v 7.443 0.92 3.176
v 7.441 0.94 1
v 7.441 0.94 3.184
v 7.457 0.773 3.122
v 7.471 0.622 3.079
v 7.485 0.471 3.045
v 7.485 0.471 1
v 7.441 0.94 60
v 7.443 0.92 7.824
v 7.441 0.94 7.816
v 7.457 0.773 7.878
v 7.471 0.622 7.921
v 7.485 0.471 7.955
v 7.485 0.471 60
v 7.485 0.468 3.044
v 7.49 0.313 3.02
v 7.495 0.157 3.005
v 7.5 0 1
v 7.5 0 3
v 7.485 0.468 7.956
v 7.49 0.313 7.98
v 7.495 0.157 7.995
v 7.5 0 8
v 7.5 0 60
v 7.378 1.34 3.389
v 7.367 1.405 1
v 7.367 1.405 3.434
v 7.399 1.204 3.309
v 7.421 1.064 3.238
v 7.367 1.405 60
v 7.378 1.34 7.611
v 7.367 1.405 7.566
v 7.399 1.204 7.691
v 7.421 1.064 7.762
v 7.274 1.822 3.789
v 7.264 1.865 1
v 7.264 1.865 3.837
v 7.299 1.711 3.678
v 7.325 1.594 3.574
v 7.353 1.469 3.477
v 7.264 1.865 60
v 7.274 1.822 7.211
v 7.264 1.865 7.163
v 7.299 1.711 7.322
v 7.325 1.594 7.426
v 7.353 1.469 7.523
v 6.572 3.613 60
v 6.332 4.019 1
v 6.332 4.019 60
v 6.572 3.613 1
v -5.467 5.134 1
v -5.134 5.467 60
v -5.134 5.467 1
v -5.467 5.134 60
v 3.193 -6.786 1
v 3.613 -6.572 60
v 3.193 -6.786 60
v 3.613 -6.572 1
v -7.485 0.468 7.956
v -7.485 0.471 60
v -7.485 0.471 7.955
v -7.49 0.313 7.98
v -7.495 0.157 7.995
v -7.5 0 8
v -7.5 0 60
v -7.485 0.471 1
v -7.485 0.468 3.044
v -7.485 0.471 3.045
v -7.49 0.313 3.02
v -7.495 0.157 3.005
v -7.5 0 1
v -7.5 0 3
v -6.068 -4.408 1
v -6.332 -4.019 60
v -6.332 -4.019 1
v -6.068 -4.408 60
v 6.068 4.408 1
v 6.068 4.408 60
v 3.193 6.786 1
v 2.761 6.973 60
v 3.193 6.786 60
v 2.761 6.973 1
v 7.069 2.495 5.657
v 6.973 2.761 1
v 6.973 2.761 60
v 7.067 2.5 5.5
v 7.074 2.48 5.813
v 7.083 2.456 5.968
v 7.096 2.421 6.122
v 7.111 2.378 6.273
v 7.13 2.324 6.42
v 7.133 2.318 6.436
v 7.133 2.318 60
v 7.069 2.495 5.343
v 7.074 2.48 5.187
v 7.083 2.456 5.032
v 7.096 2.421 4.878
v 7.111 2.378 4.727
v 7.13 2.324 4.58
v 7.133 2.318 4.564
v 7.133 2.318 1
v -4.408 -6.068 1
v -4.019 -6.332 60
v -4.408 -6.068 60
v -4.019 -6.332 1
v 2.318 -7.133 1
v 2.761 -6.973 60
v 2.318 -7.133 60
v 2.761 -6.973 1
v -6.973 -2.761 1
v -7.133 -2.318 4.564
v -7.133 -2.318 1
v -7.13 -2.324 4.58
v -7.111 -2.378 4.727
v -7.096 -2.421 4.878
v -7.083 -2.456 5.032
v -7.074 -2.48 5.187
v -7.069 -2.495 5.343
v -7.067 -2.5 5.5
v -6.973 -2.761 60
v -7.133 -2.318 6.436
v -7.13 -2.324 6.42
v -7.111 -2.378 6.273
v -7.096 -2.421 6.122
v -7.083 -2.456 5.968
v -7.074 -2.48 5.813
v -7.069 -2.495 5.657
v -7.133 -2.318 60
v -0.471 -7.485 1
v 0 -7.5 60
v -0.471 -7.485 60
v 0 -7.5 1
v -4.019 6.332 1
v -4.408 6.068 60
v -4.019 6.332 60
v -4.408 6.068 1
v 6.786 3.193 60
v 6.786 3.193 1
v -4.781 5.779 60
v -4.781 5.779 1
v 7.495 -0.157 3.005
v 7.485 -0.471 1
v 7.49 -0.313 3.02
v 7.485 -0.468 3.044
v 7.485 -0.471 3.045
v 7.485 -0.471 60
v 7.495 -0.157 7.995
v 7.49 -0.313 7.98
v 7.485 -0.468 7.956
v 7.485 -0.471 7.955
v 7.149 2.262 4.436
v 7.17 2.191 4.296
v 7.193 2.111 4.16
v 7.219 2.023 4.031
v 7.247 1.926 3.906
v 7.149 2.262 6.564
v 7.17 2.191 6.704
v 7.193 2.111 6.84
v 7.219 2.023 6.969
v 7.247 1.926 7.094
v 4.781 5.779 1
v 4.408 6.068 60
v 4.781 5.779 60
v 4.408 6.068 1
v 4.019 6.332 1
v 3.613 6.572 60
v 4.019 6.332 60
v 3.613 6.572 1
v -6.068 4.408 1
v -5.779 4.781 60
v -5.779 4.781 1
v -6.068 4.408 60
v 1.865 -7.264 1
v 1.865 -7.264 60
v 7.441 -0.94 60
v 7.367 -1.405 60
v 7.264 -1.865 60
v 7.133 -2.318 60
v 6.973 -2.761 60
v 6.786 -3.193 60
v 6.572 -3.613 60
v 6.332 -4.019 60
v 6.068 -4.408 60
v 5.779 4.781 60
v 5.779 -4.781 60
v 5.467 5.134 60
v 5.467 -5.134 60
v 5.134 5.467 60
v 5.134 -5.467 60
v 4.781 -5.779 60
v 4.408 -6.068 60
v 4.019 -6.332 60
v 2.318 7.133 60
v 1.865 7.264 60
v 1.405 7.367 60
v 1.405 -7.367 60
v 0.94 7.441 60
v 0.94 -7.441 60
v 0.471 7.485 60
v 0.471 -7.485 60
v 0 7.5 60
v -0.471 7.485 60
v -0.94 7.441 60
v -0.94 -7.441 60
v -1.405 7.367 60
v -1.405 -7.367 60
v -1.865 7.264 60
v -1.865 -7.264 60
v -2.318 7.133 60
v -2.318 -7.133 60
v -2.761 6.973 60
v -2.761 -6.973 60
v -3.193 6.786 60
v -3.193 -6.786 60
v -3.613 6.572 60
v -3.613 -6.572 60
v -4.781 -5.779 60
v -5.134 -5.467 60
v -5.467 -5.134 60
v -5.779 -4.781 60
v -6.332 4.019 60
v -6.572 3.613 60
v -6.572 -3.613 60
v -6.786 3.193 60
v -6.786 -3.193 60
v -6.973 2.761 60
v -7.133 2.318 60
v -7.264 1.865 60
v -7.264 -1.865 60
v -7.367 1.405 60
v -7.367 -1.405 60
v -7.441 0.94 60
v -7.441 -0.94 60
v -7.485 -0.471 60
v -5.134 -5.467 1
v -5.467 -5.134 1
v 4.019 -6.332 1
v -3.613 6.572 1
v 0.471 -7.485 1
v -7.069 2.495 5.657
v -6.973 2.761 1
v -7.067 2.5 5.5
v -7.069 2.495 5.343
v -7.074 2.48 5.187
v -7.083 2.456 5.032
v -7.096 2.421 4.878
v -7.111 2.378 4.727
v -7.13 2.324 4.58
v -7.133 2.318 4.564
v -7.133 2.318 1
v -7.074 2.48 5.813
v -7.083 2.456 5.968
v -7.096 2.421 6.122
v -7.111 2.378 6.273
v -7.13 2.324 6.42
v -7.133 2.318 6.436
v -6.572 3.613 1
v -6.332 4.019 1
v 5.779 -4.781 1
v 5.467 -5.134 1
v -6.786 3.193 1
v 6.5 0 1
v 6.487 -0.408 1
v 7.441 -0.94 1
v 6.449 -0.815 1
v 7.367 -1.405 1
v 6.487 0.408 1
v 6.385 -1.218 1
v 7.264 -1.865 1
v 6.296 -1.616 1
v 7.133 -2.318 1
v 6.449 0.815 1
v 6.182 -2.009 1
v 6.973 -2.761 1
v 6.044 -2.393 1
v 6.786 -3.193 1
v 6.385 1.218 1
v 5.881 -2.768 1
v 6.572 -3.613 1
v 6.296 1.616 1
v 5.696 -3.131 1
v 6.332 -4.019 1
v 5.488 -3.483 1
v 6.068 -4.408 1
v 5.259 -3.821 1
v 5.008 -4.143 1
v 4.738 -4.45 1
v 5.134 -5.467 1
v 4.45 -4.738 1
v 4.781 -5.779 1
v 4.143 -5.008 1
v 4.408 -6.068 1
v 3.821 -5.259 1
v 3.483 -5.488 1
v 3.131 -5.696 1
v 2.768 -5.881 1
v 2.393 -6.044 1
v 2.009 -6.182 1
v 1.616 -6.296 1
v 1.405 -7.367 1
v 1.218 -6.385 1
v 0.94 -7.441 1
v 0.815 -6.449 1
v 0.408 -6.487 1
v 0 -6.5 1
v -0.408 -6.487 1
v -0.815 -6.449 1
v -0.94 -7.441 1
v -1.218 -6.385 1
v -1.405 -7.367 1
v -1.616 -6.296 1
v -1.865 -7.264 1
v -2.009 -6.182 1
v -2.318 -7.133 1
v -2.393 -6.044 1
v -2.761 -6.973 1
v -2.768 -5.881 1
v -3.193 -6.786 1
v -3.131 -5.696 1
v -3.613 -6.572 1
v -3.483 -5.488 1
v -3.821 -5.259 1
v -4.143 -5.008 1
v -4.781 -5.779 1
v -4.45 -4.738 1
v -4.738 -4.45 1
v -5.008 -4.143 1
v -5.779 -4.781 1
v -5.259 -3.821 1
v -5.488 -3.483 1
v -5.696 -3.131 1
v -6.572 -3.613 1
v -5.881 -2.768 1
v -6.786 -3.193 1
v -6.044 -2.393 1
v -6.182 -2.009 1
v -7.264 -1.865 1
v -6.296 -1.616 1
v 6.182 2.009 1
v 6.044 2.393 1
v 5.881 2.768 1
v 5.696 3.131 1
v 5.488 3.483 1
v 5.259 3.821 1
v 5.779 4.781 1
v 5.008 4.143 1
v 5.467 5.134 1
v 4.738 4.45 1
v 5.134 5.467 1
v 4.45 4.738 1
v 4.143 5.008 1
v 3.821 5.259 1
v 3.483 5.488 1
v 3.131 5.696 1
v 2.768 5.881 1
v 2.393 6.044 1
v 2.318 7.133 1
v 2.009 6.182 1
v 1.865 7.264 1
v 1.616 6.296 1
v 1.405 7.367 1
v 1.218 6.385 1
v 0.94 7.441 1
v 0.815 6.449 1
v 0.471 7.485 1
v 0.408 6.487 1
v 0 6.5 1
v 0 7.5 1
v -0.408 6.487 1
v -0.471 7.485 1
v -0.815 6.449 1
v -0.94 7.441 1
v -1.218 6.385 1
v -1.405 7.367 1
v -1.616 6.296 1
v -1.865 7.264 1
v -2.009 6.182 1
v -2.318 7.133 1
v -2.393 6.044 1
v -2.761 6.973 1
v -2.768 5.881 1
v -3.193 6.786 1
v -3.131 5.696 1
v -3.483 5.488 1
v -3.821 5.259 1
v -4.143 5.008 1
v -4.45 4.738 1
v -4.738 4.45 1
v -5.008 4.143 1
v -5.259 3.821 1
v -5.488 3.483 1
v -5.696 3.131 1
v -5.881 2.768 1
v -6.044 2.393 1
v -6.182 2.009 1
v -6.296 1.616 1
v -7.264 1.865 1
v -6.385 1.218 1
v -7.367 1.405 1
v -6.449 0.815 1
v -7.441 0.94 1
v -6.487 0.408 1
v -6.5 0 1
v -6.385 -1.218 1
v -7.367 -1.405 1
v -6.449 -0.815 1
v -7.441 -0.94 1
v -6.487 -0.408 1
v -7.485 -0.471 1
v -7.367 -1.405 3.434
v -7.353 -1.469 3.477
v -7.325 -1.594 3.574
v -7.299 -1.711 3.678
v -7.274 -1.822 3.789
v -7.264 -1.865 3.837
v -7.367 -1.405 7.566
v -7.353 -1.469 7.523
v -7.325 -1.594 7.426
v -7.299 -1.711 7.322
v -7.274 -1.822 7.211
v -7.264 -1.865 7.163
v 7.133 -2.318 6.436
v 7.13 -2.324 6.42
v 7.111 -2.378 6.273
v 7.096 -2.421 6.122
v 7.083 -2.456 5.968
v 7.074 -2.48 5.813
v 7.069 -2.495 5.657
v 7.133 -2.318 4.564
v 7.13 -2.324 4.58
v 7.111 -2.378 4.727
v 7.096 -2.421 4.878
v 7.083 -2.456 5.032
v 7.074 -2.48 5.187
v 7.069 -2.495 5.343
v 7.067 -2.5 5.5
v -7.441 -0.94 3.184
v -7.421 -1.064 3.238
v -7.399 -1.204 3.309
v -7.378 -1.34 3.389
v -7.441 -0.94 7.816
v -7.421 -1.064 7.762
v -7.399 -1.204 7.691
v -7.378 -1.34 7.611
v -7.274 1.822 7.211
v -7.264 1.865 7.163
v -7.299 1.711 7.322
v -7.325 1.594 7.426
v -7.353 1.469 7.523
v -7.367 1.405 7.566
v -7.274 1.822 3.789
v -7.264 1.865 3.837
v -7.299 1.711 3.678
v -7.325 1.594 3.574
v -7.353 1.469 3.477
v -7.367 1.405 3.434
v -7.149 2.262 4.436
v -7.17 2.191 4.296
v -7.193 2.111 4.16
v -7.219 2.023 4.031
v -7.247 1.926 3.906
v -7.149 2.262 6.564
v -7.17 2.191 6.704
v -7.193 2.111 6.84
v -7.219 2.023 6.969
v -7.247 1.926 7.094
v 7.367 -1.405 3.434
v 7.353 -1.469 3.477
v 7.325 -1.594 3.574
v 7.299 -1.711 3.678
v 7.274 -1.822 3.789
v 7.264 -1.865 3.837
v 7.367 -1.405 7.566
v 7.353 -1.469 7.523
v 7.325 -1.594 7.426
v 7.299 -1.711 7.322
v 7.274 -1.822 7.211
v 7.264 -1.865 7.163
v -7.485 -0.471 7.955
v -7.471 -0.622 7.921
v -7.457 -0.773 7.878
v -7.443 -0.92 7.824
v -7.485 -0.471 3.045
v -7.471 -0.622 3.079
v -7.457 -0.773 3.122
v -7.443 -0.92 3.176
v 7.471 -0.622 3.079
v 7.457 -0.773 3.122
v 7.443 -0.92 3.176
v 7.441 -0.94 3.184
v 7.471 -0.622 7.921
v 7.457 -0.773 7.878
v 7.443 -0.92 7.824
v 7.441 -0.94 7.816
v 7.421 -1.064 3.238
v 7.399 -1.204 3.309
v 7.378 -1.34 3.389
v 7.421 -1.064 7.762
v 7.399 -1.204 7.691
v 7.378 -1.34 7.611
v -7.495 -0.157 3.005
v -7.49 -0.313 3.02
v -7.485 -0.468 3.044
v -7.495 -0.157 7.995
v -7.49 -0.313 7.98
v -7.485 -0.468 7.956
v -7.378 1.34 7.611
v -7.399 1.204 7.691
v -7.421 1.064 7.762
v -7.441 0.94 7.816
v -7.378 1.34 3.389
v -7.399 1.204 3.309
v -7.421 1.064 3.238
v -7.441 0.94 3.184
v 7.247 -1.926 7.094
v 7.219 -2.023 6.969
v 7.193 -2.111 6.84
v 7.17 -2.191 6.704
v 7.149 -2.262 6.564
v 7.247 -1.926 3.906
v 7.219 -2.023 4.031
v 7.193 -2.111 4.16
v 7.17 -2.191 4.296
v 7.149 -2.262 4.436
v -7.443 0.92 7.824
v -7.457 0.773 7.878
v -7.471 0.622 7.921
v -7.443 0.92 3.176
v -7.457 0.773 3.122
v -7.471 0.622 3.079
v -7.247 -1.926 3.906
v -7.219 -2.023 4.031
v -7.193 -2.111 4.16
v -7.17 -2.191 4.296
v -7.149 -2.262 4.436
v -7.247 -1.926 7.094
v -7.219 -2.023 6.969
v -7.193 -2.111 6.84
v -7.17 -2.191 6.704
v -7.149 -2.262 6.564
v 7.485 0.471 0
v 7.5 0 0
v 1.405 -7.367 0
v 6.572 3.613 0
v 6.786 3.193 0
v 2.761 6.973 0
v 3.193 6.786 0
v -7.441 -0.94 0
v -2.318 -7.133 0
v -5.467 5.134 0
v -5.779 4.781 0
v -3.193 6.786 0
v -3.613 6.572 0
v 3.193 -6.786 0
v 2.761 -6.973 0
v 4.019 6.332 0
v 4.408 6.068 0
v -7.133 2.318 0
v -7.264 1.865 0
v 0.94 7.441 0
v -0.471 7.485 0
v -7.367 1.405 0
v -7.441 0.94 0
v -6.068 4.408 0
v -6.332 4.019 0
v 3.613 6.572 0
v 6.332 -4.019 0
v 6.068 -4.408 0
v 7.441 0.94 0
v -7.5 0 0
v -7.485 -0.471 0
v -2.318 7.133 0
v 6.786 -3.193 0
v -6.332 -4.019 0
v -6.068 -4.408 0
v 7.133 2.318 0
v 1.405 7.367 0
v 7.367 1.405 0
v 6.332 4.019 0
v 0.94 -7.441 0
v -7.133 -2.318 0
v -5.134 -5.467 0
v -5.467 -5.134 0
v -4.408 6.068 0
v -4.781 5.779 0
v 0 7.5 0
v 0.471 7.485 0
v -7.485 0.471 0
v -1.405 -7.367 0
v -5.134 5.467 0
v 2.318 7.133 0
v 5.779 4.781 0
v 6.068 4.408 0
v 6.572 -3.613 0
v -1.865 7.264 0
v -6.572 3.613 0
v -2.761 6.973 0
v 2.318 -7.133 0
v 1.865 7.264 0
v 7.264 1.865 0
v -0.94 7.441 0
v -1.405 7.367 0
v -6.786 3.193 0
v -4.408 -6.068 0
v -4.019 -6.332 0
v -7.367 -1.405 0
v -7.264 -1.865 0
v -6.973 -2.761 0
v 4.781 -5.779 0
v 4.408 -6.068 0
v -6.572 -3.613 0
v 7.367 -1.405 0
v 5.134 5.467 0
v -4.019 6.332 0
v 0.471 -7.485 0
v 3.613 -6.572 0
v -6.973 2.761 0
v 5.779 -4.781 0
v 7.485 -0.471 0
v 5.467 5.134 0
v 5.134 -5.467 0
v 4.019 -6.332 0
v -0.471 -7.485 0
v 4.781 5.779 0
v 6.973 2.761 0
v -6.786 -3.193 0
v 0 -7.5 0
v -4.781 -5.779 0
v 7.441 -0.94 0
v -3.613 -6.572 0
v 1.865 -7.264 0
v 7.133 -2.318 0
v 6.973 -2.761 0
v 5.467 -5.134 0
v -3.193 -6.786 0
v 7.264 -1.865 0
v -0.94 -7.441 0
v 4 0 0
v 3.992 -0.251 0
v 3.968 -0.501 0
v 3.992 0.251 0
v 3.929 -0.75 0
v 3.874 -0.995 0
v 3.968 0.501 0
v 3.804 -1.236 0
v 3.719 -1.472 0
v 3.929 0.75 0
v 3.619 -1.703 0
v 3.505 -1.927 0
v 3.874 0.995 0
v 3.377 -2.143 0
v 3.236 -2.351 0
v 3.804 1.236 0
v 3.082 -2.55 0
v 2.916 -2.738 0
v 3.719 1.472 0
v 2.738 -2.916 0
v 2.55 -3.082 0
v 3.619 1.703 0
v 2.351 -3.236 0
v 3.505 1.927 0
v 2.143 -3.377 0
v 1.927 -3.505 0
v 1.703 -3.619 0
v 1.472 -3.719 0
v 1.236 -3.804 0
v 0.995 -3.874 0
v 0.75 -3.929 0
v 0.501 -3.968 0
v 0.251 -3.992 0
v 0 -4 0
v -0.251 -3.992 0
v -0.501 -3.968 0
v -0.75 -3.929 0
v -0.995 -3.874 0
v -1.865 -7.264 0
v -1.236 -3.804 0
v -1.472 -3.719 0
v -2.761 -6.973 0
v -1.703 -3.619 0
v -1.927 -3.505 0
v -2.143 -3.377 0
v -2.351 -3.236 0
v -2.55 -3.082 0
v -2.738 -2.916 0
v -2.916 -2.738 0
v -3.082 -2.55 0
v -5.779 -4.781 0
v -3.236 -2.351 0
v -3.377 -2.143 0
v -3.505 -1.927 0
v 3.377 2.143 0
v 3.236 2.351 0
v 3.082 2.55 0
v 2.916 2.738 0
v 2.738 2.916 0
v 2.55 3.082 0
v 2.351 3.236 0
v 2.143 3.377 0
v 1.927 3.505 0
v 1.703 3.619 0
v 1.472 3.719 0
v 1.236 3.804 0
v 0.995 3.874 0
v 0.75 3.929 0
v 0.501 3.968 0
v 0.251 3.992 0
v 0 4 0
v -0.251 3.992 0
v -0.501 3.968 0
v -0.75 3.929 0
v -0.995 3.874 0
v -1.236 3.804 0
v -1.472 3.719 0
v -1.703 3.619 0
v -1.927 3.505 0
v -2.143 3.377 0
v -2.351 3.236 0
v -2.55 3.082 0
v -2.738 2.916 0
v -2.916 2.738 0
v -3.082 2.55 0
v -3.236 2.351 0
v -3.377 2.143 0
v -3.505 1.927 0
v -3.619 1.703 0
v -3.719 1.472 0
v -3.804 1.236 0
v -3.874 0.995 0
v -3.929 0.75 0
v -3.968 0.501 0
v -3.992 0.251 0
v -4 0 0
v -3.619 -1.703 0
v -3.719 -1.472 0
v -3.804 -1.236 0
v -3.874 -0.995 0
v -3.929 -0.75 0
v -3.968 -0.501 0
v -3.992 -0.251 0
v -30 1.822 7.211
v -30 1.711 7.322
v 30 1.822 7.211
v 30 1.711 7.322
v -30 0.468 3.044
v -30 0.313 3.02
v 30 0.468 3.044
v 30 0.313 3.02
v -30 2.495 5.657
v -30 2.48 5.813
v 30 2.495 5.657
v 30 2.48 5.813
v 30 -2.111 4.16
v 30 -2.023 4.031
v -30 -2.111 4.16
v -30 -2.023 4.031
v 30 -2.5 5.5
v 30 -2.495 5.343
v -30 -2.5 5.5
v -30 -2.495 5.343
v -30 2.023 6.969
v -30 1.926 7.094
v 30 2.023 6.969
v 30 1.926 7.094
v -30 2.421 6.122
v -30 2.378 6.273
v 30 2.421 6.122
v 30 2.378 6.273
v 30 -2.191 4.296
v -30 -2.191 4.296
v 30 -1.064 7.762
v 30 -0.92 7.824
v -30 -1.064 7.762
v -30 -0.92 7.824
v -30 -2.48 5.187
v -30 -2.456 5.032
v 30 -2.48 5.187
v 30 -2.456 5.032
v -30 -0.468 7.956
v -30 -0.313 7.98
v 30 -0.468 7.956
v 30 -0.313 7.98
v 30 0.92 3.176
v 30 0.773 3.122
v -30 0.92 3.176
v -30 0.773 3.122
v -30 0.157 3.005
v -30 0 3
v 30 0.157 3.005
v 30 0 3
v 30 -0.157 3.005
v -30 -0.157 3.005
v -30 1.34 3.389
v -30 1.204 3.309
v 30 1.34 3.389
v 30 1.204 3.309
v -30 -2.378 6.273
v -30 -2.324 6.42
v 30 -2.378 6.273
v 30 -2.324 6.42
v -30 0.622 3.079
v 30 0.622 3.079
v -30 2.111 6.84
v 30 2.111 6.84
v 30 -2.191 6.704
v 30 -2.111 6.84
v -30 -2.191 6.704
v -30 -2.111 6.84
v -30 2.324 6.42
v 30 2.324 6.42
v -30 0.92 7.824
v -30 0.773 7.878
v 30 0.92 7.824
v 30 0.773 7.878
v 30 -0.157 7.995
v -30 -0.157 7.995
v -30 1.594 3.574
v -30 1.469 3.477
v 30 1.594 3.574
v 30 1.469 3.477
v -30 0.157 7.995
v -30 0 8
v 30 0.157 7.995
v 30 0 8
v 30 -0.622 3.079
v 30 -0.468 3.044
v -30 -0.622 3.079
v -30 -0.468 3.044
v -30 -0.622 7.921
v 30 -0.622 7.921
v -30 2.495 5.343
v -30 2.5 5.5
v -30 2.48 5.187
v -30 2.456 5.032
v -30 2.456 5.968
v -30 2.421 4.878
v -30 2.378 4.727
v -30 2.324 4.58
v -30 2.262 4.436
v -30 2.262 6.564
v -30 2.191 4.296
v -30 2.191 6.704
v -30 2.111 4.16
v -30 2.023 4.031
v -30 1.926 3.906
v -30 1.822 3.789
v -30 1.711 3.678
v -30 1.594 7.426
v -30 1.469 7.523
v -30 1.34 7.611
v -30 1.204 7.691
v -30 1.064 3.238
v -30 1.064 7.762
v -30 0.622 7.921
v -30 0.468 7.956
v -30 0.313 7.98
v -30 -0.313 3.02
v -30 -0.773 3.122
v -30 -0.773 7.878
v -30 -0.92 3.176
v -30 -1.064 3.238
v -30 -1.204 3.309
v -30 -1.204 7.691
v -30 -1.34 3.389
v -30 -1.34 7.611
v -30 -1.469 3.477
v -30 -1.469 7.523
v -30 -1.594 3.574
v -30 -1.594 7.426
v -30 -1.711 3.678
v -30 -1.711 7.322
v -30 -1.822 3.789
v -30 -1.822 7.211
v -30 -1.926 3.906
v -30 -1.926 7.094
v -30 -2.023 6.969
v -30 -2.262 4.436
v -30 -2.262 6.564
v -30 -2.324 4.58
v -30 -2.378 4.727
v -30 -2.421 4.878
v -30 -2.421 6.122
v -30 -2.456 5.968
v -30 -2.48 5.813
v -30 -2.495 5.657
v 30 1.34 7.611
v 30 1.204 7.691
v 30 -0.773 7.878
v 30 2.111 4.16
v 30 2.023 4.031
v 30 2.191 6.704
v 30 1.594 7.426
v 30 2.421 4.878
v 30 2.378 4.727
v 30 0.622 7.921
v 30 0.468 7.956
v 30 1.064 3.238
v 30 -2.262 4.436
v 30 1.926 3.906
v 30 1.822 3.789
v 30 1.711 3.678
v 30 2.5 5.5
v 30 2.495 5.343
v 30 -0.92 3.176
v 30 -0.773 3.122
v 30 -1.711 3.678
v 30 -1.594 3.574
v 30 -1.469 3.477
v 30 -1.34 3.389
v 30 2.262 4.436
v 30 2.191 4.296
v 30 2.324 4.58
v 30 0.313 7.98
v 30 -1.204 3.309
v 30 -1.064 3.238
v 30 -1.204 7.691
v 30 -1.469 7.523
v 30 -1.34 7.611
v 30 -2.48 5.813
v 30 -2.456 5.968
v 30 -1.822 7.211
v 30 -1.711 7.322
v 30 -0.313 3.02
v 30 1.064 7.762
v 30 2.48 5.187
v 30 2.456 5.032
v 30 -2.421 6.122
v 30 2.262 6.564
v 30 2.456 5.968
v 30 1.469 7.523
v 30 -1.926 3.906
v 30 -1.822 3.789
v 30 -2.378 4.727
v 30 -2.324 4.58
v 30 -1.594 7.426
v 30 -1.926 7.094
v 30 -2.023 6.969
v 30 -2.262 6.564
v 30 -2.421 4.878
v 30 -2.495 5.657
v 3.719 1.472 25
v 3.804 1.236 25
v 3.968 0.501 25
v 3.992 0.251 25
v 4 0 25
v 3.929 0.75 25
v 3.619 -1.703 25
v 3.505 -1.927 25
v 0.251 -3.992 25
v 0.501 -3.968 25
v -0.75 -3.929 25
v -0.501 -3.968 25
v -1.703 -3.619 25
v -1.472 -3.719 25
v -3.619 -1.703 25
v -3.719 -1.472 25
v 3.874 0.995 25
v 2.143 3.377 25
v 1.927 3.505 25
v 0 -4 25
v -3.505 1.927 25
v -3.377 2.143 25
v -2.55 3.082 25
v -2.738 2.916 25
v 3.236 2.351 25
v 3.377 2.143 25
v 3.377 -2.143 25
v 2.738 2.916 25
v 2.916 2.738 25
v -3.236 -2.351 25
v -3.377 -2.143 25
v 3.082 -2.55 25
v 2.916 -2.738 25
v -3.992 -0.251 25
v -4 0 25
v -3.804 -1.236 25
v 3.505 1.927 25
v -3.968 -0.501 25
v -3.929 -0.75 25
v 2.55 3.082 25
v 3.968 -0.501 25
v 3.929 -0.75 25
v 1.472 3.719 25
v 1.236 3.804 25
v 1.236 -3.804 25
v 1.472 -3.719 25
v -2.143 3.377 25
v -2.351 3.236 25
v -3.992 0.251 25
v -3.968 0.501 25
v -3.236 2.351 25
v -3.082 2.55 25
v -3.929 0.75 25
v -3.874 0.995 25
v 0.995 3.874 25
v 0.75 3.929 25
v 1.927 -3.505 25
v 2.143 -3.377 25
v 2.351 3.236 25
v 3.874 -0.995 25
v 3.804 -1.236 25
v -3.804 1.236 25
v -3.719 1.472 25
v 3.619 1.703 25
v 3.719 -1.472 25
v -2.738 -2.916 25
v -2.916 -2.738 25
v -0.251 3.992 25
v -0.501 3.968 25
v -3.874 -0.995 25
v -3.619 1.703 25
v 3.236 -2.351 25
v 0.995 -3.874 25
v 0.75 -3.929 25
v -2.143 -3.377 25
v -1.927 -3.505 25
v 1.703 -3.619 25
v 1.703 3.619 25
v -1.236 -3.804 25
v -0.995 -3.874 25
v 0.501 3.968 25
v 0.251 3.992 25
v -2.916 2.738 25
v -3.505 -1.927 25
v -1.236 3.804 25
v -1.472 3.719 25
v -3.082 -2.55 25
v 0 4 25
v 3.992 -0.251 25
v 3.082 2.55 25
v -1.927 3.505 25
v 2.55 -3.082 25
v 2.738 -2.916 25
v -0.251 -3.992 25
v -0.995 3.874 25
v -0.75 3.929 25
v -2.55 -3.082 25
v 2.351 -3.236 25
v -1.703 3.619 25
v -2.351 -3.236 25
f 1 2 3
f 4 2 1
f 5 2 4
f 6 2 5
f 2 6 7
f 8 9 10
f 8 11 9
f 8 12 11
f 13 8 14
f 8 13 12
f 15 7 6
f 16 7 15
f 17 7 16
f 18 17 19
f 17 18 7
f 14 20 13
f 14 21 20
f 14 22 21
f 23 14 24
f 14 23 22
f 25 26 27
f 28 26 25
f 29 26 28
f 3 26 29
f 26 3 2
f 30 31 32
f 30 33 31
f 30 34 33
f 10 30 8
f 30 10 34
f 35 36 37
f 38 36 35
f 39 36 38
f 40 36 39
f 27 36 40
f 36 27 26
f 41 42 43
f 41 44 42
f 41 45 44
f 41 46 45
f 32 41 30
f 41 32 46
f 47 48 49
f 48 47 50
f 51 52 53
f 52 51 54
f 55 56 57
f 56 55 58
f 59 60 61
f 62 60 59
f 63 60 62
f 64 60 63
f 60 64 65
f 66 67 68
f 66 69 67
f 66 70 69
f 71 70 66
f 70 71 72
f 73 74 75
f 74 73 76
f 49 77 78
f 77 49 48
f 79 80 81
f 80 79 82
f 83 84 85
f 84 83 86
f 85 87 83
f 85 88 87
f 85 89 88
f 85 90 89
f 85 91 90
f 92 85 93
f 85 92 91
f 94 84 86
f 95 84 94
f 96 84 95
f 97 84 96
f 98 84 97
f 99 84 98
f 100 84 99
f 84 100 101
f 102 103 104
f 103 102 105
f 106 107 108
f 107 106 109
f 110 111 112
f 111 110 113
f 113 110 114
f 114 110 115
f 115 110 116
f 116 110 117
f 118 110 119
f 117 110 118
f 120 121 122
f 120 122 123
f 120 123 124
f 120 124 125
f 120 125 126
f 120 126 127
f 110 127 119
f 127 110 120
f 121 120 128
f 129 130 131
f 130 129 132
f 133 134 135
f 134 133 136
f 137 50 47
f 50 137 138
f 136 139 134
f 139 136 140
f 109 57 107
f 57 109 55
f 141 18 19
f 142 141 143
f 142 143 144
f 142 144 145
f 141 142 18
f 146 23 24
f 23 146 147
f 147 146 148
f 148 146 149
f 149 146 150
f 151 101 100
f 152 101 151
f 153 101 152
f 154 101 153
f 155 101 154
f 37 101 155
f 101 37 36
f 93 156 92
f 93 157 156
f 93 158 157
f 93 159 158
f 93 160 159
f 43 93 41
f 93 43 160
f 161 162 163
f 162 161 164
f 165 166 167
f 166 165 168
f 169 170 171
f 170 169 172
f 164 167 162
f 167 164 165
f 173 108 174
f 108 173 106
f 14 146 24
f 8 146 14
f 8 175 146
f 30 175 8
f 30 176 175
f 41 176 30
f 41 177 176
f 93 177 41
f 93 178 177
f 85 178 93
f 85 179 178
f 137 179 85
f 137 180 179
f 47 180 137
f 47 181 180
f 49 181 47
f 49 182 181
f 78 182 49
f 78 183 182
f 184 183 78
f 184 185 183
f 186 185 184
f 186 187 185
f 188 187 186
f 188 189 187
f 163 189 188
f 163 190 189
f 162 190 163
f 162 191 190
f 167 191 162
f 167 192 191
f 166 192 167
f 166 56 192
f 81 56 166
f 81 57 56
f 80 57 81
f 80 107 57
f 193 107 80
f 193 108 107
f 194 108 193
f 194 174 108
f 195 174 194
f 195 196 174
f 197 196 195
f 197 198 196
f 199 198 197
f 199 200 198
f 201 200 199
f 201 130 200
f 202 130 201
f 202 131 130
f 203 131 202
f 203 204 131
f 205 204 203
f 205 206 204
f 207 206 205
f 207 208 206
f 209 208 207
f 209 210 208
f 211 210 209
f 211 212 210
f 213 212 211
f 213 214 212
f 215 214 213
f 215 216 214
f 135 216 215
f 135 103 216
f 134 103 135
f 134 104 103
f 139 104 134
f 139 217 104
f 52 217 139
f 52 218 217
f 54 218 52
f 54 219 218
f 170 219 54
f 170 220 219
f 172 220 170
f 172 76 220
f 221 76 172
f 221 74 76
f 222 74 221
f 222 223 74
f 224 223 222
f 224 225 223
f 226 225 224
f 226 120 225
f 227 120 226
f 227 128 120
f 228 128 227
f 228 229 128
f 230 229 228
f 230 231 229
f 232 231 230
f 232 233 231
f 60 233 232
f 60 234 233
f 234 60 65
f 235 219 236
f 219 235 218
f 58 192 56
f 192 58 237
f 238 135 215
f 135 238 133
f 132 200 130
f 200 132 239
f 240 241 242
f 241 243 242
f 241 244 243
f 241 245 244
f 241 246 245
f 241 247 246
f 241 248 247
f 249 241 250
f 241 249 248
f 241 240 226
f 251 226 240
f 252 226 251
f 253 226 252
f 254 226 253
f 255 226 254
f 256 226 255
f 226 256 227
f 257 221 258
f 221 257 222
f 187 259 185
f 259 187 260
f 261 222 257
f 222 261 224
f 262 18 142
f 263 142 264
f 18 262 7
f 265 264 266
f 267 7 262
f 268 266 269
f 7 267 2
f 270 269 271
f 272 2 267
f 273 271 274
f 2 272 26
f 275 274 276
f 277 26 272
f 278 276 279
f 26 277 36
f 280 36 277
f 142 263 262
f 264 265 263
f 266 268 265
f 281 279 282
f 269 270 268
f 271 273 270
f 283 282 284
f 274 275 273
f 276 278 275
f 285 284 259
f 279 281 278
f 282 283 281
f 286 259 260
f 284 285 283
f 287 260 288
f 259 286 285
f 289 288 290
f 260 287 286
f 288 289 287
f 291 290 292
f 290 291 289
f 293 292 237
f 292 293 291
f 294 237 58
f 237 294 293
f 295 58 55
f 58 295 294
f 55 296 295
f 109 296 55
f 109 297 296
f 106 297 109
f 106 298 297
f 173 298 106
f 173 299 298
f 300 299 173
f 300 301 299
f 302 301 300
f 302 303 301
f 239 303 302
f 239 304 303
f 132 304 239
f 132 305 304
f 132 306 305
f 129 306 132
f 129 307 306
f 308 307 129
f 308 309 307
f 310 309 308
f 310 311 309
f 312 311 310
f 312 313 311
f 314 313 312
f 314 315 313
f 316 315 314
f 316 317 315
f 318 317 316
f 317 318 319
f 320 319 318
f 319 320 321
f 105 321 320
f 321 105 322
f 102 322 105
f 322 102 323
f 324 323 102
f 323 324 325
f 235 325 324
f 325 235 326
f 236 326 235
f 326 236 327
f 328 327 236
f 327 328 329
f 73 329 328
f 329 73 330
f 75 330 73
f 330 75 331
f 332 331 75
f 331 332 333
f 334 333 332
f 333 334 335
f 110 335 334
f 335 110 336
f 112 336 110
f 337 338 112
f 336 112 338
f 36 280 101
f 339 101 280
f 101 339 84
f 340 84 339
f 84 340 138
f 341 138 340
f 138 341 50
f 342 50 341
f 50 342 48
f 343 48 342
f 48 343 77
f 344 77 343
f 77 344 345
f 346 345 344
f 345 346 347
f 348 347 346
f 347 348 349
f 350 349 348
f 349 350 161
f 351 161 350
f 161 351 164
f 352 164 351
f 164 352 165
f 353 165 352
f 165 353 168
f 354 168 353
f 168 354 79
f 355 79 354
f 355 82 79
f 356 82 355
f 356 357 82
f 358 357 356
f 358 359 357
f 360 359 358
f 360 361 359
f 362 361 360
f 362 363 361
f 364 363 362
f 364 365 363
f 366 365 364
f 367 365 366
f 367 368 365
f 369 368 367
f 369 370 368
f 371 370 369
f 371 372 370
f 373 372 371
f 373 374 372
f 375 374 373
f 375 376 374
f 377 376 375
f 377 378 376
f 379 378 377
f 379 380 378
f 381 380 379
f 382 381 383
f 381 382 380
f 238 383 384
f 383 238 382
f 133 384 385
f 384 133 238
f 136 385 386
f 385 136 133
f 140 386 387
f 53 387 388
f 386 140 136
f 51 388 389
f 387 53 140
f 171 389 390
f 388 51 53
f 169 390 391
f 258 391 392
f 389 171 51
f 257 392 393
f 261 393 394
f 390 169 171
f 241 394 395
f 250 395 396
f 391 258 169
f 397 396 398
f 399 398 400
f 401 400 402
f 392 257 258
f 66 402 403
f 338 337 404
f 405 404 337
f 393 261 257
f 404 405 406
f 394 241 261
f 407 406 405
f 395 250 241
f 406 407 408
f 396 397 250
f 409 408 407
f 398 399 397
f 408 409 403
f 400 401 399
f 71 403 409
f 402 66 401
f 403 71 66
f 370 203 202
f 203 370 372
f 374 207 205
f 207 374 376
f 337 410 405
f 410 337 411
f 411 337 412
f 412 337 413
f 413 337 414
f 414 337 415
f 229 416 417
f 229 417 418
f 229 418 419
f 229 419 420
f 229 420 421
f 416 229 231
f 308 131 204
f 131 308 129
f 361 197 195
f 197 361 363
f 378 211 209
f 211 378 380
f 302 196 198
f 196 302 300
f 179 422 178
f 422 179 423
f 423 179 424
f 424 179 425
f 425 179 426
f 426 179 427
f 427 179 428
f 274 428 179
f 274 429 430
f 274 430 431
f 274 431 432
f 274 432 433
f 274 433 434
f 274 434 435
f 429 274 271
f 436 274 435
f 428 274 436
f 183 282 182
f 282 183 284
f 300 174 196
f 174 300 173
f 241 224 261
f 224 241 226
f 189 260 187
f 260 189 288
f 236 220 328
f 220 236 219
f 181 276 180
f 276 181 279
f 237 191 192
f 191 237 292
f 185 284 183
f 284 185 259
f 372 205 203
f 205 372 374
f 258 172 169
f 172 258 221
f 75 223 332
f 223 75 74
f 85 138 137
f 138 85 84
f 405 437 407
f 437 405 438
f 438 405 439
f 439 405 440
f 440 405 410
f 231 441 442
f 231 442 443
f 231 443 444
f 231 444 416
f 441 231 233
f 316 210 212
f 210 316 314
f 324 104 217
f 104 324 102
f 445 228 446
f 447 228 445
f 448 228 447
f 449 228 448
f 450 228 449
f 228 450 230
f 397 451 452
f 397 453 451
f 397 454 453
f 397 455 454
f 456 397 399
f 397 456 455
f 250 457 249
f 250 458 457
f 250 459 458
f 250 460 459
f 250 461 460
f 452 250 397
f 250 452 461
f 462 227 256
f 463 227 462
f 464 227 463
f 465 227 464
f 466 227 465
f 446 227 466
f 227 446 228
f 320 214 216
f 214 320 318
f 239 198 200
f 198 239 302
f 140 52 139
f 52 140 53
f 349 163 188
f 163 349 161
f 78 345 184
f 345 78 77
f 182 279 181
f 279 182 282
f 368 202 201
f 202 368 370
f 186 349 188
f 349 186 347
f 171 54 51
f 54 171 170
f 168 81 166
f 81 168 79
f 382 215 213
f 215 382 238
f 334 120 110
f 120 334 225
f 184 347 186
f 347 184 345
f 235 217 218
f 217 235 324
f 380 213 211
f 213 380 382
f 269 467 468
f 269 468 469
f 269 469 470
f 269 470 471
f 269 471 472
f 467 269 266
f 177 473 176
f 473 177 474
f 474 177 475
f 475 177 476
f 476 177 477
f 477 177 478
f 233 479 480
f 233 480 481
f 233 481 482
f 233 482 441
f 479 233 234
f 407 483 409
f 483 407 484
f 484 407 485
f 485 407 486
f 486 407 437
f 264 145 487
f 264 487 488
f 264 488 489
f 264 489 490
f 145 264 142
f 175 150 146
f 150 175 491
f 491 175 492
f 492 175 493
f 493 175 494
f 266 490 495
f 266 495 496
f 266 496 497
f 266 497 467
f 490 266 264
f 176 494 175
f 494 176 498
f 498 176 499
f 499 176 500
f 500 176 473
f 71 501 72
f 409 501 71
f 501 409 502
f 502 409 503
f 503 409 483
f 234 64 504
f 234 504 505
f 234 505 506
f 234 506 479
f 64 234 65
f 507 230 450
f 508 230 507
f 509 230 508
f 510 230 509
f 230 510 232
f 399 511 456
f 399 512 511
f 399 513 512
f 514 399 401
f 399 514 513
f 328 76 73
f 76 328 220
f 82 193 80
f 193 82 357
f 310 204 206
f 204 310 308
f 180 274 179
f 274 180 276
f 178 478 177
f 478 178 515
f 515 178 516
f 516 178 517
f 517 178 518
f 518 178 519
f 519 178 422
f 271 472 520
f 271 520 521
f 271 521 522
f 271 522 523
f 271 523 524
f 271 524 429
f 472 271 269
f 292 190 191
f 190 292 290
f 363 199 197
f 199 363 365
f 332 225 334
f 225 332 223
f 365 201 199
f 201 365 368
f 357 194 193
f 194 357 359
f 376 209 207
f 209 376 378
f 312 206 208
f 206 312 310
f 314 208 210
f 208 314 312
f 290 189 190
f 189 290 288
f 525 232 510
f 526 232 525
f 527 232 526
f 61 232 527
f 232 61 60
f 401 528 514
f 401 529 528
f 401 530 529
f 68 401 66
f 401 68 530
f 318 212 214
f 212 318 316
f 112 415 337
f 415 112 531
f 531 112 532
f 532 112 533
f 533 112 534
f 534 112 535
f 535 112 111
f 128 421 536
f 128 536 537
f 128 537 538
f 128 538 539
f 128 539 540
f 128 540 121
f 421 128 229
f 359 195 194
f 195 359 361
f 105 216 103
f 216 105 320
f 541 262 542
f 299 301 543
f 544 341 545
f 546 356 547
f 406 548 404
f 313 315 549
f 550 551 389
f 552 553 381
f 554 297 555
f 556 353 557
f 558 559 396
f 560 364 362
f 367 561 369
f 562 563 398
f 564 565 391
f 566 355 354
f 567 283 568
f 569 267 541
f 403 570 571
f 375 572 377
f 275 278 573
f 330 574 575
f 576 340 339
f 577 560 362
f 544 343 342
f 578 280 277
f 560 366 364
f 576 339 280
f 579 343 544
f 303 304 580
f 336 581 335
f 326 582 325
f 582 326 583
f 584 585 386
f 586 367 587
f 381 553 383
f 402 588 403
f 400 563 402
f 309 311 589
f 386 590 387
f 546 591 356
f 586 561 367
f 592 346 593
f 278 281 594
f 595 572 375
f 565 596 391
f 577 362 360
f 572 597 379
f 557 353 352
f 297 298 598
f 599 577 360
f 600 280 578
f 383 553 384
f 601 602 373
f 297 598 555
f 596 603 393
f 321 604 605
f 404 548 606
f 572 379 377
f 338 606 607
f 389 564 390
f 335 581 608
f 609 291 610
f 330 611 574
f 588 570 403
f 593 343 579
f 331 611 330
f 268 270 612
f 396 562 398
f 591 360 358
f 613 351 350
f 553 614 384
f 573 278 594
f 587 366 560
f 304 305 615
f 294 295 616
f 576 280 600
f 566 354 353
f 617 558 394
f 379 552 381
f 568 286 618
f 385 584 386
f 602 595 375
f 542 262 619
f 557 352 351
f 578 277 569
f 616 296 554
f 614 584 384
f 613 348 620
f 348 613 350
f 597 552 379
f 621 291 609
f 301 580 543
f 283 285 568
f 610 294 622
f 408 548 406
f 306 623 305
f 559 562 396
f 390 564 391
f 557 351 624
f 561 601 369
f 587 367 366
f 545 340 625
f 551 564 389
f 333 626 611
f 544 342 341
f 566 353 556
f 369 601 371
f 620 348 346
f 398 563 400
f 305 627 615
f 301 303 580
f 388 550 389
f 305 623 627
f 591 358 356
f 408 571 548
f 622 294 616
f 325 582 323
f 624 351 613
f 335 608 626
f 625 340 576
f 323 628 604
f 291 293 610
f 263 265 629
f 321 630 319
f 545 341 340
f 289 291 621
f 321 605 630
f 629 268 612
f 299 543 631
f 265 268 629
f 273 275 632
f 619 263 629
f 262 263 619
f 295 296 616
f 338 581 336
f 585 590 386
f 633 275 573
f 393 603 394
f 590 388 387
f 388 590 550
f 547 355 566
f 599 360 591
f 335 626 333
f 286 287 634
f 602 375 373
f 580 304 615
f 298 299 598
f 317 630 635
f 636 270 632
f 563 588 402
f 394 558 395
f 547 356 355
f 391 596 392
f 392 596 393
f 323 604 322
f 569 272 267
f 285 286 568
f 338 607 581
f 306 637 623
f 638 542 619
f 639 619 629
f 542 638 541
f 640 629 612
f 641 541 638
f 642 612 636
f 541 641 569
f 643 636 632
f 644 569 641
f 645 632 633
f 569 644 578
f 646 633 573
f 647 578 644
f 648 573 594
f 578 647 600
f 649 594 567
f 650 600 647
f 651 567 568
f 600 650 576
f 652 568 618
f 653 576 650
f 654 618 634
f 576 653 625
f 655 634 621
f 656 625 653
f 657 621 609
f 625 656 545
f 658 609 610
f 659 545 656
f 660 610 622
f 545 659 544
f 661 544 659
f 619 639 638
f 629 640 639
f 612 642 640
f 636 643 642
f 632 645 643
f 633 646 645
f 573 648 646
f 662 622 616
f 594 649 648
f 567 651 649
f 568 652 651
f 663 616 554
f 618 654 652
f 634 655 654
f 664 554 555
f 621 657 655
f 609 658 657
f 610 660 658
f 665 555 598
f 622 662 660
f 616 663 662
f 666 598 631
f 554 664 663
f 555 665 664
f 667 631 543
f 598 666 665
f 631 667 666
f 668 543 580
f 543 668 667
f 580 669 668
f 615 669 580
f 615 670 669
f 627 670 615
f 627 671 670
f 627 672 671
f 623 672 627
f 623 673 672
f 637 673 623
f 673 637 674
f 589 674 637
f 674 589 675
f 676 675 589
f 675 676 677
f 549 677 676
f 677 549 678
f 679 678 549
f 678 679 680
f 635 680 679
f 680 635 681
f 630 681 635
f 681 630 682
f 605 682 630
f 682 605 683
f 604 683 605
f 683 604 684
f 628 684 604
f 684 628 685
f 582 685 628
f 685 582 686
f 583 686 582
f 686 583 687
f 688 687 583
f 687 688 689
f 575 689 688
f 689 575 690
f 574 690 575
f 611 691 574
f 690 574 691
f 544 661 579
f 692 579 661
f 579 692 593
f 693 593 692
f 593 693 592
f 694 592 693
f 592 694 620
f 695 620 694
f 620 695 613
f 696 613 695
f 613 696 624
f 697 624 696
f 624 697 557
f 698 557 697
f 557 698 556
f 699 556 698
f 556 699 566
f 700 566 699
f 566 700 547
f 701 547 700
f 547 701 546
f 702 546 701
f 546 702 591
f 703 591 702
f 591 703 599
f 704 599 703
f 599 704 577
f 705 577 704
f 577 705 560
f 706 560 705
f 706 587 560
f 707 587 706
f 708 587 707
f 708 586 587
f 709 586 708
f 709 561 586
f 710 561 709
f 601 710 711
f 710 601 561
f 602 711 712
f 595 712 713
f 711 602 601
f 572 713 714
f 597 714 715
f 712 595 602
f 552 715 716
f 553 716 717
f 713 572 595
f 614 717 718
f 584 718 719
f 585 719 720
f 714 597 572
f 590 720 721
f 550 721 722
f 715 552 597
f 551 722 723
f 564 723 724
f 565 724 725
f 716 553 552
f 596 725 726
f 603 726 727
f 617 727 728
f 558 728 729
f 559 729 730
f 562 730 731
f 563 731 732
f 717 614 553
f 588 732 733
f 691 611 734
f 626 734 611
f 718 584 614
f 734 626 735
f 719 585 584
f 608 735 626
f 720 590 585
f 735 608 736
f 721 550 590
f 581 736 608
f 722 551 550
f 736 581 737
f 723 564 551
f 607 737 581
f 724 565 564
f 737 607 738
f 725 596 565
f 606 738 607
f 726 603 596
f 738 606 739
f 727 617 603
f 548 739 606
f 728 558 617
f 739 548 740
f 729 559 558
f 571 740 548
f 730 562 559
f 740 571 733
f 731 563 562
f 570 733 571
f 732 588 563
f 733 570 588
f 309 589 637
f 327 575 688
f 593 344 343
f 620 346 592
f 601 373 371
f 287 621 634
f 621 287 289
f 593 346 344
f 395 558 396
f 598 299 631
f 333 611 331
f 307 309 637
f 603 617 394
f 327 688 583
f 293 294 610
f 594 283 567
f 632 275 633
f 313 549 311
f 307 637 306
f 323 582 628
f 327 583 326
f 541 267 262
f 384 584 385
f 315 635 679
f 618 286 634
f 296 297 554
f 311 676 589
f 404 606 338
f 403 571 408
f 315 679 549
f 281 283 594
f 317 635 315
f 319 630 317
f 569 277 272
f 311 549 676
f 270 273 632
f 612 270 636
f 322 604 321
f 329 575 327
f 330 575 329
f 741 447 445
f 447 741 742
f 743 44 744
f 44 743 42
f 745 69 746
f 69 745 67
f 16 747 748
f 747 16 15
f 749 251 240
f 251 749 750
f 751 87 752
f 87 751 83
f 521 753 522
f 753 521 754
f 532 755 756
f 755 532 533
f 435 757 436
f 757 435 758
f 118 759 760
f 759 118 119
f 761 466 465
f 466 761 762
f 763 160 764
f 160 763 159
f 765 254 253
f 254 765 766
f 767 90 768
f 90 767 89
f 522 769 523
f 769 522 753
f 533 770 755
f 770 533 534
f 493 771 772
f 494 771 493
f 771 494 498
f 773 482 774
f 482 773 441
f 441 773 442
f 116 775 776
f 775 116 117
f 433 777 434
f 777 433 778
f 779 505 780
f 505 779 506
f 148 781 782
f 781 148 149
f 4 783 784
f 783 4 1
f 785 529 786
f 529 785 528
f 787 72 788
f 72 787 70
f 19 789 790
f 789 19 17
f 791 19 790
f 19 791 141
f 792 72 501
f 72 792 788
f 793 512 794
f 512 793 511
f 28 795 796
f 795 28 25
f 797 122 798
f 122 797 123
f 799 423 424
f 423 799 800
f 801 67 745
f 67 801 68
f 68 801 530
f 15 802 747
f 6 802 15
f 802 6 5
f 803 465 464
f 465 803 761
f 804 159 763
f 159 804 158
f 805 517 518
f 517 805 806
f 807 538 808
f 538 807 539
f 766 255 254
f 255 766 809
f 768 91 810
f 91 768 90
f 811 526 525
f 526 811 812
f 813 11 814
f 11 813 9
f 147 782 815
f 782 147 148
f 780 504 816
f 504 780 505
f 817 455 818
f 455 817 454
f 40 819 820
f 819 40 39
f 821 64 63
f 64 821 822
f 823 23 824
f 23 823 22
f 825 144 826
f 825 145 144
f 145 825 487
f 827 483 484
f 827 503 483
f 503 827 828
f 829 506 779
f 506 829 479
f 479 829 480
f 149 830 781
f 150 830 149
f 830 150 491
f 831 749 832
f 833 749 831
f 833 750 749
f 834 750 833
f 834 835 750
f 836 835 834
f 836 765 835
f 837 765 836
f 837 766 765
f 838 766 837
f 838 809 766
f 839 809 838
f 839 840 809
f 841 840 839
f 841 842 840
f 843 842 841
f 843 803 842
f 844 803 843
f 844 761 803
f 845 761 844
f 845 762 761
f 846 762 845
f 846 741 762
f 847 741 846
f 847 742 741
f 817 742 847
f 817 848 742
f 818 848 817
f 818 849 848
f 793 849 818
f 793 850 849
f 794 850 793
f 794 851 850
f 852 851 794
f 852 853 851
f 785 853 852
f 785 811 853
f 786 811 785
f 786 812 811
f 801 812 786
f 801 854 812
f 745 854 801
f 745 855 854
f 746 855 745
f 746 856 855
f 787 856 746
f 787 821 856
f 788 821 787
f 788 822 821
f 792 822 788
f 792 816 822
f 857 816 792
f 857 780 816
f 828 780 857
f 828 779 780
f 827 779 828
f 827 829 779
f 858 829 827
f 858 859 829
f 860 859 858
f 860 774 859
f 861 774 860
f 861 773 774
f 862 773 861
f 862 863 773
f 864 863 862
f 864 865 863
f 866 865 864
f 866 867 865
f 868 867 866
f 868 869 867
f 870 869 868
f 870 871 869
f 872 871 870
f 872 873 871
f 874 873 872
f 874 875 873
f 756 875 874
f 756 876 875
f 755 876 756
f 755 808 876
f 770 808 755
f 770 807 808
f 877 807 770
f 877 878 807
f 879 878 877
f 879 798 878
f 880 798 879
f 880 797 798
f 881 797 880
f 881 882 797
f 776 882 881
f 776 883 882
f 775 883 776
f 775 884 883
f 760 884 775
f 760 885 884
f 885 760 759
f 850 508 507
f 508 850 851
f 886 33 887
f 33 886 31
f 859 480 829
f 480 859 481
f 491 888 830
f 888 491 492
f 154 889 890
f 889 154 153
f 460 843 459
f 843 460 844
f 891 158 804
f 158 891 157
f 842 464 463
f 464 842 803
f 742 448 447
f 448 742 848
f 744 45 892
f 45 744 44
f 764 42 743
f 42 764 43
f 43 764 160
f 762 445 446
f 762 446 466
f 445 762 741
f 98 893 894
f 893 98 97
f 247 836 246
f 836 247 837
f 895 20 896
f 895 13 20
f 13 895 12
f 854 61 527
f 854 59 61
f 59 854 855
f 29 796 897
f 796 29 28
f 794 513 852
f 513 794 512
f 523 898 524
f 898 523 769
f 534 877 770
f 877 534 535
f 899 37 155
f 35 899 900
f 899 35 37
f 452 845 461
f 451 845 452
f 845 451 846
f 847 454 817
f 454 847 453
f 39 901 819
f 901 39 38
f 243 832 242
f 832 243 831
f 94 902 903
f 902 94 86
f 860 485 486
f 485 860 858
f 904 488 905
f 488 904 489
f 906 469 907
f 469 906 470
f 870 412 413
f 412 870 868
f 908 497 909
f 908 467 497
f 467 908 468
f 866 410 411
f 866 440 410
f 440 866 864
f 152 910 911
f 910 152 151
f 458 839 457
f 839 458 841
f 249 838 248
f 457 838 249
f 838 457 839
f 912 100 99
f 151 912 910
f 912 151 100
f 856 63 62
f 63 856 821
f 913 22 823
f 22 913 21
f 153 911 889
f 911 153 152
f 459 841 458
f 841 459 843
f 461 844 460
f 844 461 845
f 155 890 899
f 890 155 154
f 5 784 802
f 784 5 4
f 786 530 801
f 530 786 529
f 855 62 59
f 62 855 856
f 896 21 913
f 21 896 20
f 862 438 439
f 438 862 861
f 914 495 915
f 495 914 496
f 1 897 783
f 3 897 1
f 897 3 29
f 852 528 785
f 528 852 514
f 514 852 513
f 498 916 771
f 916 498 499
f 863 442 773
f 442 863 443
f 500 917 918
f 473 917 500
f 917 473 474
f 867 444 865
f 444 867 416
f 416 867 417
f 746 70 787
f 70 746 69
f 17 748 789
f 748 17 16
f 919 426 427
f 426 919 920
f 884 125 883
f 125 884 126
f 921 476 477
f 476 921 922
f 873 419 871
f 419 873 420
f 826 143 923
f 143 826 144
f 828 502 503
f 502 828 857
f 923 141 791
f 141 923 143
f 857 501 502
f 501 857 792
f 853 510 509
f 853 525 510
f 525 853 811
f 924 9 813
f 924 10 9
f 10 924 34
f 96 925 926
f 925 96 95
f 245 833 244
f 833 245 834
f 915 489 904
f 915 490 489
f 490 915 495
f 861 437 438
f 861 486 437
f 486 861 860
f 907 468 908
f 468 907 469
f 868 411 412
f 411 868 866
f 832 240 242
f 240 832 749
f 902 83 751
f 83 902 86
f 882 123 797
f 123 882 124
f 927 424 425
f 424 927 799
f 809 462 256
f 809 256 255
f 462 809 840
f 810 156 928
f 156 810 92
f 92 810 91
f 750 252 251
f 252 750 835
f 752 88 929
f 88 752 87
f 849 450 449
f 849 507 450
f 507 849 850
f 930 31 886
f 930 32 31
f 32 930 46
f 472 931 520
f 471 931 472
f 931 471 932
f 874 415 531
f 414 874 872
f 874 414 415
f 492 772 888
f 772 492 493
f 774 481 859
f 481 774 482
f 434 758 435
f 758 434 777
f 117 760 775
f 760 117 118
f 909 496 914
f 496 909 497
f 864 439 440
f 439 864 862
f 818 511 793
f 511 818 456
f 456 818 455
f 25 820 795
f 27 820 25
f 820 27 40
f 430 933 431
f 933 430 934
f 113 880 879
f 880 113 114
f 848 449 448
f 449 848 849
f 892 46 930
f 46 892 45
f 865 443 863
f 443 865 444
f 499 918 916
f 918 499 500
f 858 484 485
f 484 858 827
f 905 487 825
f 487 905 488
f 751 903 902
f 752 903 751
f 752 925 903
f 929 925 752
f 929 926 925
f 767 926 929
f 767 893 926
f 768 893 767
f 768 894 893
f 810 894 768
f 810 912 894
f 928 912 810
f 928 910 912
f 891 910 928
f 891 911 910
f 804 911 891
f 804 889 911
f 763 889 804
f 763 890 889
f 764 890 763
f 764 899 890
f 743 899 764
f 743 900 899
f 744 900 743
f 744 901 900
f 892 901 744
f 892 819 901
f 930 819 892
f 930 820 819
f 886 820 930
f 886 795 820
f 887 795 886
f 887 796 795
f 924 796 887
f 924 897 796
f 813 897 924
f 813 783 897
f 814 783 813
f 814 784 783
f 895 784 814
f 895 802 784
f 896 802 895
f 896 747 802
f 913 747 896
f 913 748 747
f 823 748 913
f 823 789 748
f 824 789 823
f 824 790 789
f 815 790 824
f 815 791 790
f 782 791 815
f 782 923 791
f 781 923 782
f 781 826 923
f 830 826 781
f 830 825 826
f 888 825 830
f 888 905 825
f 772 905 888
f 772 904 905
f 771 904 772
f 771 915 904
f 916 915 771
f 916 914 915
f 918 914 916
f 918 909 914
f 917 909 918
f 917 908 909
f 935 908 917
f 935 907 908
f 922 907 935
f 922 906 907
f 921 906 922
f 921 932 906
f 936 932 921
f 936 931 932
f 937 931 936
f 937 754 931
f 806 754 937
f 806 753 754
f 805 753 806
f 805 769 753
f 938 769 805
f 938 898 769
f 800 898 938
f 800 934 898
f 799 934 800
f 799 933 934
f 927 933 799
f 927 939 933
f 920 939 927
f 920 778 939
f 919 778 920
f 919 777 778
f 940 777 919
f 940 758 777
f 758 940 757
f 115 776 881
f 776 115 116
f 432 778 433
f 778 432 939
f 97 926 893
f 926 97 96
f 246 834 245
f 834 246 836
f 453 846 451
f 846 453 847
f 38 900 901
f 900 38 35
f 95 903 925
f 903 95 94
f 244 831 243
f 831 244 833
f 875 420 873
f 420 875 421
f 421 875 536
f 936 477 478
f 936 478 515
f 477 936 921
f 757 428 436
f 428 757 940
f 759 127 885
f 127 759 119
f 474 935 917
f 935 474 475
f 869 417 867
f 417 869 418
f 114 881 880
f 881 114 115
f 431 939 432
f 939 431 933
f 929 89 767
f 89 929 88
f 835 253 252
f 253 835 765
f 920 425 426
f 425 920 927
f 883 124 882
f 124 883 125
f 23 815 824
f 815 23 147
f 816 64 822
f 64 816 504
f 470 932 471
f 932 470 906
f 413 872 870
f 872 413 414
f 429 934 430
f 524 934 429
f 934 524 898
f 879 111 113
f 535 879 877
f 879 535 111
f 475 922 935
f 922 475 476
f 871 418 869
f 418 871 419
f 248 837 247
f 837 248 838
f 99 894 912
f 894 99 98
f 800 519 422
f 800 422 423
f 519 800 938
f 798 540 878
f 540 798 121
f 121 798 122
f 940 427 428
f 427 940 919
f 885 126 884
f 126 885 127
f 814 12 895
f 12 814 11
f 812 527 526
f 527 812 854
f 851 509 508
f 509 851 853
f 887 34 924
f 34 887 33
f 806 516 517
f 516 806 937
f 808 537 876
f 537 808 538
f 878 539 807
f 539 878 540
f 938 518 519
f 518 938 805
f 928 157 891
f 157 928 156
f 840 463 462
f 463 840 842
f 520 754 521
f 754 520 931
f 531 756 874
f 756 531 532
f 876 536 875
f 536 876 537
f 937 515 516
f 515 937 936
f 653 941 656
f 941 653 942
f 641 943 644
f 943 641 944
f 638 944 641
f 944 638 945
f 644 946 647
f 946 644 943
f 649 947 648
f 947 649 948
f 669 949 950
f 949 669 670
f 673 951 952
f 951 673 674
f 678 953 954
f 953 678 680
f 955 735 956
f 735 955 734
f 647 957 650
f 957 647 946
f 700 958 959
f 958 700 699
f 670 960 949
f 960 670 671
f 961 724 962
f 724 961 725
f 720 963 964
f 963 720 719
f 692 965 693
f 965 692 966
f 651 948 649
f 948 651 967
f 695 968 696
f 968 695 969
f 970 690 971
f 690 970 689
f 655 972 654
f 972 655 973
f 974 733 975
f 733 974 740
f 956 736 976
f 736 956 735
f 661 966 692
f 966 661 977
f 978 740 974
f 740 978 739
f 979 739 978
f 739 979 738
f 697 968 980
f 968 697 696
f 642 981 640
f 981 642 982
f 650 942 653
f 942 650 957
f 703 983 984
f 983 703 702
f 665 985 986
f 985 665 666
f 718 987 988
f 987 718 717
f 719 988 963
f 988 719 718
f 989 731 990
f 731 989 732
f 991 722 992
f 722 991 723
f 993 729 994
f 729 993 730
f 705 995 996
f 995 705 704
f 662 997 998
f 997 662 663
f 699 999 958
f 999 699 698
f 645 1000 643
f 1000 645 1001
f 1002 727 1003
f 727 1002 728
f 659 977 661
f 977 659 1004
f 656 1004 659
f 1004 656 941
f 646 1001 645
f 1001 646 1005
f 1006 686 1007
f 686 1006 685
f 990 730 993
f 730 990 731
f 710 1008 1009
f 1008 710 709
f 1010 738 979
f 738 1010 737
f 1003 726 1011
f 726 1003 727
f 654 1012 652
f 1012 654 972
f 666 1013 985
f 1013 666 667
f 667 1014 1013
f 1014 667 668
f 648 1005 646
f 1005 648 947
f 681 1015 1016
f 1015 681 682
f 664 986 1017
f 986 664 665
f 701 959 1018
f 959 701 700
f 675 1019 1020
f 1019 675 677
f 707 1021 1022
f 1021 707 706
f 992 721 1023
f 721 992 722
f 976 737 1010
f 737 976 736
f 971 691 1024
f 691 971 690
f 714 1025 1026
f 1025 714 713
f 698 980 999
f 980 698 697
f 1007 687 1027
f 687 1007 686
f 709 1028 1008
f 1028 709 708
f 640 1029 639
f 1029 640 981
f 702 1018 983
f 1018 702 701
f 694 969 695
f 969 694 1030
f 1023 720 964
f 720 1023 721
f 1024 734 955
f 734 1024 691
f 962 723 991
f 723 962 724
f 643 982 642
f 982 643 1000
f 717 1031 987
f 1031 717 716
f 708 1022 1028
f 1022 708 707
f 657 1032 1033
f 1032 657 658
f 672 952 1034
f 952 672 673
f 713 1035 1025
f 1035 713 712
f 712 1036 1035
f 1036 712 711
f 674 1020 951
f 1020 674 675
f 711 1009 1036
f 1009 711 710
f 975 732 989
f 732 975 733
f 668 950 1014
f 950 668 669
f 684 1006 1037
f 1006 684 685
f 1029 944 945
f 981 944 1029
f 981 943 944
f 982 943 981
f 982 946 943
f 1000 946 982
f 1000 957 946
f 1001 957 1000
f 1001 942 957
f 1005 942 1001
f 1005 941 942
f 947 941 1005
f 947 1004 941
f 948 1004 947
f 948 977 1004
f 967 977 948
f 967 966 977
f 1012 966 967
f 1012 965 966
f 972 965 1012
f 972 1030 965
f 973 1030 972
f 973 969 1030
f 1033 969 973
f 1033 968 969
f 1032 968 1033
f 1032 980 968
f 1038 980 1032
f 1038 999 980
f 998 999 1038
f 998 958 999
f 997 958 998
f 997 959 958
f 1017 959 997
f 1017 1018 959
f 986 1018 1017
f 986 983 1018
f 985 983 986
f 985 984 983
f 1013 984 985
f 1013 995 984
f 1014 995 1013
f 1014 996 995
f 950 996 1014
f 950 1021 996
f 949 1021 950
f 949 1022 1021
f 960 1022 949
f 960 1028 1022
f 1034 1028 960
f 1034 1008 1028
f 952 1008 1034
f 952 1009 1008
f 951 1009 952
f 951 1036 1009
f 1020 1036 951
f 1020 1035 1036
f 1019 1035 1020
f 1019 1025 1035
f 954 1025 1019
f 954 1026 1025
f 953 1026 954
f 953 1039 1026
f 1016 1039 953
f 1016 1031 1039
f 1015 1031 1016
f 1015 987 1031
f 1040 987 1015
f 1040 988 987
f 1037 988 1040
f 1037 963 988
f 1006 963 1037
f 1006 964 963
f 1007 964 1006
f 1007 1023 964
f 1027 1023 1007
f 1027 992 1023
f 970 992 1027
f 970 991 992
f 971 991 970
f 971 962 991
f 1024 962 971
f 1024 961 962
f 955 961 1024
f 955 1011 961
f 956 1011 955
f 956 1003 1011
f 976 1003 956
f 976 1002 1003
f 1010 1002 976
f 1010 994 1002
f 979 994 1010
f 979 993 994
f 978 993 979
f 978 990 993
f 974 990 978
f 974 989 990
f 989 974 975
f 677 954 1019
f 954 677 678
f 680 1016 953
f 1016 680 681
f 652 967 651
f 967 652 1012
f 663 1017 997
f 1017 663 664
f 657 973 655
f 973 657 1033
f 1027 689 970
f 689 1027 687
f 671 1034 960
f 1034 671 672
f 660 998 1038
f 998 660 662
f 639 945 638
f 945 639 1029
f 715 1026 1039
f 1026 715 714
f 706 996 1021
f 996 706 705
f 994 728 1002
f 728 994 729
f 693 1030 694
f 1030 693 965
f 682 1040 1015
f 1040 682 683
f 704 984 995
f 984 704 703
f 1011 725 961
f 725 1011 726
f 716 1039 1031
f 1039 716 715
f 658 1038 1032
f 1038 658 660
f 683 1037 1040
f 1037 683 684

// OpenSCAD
//--------------------------------------------------------------
// T‑handle tap holder
// (single, manifold part as specified)
//--------------------------------------------------------------

// --- Global quality setting ----------------------------------
$fn = 100;                 // smoothness for circular features

//--------------------------------------------------------------
// Build the part
//--------------------------------------------------------------
difference() {

    //---------------  SOLID GEOMETRY  -------------------------
    union() {

        //------------------- Shank (Ø15 × 60) with 1 mm chamfer
        //
        //  • Main body: full‑radius cylinder, 59 mm long
        //  • Chamfer: 1 mm high 45° frustum
        //
        translate([0,0, 1])               // start main body at Z = 1 mm
            cylinder(d = 15, h = 59);     // ends at Z = 60 mm

        cylinder(h = 1,                   // chamfer section (Z = 0 → 1 mm)
                 r1 = 7.5,                // radius at Z = 0 mm
                 r2 = 6.5);               // radius at Z = 1 mm


        //------------------- T‑handle (Ø5 × 60, centred) -------
        //
        //  • Axis along X, total length 60 mm (±30 mm from origin)
        //  • Centre positioned at Z = 5.5 mm
        //
        translate([0, 0, 5.5])            // locate handle along Z
            rotate([0, 90, 0])            // align cylinder along X
                cylinder(d = 5, h = 60, center = true);
    }

    //-------------------- Axial tap hole (Ø8 × 25) -------------
    translate([0, 0, 0])                  // starts flush with shank end
        cylinder(d = 8, h = 25);          // depth 25 mm into shank
}
